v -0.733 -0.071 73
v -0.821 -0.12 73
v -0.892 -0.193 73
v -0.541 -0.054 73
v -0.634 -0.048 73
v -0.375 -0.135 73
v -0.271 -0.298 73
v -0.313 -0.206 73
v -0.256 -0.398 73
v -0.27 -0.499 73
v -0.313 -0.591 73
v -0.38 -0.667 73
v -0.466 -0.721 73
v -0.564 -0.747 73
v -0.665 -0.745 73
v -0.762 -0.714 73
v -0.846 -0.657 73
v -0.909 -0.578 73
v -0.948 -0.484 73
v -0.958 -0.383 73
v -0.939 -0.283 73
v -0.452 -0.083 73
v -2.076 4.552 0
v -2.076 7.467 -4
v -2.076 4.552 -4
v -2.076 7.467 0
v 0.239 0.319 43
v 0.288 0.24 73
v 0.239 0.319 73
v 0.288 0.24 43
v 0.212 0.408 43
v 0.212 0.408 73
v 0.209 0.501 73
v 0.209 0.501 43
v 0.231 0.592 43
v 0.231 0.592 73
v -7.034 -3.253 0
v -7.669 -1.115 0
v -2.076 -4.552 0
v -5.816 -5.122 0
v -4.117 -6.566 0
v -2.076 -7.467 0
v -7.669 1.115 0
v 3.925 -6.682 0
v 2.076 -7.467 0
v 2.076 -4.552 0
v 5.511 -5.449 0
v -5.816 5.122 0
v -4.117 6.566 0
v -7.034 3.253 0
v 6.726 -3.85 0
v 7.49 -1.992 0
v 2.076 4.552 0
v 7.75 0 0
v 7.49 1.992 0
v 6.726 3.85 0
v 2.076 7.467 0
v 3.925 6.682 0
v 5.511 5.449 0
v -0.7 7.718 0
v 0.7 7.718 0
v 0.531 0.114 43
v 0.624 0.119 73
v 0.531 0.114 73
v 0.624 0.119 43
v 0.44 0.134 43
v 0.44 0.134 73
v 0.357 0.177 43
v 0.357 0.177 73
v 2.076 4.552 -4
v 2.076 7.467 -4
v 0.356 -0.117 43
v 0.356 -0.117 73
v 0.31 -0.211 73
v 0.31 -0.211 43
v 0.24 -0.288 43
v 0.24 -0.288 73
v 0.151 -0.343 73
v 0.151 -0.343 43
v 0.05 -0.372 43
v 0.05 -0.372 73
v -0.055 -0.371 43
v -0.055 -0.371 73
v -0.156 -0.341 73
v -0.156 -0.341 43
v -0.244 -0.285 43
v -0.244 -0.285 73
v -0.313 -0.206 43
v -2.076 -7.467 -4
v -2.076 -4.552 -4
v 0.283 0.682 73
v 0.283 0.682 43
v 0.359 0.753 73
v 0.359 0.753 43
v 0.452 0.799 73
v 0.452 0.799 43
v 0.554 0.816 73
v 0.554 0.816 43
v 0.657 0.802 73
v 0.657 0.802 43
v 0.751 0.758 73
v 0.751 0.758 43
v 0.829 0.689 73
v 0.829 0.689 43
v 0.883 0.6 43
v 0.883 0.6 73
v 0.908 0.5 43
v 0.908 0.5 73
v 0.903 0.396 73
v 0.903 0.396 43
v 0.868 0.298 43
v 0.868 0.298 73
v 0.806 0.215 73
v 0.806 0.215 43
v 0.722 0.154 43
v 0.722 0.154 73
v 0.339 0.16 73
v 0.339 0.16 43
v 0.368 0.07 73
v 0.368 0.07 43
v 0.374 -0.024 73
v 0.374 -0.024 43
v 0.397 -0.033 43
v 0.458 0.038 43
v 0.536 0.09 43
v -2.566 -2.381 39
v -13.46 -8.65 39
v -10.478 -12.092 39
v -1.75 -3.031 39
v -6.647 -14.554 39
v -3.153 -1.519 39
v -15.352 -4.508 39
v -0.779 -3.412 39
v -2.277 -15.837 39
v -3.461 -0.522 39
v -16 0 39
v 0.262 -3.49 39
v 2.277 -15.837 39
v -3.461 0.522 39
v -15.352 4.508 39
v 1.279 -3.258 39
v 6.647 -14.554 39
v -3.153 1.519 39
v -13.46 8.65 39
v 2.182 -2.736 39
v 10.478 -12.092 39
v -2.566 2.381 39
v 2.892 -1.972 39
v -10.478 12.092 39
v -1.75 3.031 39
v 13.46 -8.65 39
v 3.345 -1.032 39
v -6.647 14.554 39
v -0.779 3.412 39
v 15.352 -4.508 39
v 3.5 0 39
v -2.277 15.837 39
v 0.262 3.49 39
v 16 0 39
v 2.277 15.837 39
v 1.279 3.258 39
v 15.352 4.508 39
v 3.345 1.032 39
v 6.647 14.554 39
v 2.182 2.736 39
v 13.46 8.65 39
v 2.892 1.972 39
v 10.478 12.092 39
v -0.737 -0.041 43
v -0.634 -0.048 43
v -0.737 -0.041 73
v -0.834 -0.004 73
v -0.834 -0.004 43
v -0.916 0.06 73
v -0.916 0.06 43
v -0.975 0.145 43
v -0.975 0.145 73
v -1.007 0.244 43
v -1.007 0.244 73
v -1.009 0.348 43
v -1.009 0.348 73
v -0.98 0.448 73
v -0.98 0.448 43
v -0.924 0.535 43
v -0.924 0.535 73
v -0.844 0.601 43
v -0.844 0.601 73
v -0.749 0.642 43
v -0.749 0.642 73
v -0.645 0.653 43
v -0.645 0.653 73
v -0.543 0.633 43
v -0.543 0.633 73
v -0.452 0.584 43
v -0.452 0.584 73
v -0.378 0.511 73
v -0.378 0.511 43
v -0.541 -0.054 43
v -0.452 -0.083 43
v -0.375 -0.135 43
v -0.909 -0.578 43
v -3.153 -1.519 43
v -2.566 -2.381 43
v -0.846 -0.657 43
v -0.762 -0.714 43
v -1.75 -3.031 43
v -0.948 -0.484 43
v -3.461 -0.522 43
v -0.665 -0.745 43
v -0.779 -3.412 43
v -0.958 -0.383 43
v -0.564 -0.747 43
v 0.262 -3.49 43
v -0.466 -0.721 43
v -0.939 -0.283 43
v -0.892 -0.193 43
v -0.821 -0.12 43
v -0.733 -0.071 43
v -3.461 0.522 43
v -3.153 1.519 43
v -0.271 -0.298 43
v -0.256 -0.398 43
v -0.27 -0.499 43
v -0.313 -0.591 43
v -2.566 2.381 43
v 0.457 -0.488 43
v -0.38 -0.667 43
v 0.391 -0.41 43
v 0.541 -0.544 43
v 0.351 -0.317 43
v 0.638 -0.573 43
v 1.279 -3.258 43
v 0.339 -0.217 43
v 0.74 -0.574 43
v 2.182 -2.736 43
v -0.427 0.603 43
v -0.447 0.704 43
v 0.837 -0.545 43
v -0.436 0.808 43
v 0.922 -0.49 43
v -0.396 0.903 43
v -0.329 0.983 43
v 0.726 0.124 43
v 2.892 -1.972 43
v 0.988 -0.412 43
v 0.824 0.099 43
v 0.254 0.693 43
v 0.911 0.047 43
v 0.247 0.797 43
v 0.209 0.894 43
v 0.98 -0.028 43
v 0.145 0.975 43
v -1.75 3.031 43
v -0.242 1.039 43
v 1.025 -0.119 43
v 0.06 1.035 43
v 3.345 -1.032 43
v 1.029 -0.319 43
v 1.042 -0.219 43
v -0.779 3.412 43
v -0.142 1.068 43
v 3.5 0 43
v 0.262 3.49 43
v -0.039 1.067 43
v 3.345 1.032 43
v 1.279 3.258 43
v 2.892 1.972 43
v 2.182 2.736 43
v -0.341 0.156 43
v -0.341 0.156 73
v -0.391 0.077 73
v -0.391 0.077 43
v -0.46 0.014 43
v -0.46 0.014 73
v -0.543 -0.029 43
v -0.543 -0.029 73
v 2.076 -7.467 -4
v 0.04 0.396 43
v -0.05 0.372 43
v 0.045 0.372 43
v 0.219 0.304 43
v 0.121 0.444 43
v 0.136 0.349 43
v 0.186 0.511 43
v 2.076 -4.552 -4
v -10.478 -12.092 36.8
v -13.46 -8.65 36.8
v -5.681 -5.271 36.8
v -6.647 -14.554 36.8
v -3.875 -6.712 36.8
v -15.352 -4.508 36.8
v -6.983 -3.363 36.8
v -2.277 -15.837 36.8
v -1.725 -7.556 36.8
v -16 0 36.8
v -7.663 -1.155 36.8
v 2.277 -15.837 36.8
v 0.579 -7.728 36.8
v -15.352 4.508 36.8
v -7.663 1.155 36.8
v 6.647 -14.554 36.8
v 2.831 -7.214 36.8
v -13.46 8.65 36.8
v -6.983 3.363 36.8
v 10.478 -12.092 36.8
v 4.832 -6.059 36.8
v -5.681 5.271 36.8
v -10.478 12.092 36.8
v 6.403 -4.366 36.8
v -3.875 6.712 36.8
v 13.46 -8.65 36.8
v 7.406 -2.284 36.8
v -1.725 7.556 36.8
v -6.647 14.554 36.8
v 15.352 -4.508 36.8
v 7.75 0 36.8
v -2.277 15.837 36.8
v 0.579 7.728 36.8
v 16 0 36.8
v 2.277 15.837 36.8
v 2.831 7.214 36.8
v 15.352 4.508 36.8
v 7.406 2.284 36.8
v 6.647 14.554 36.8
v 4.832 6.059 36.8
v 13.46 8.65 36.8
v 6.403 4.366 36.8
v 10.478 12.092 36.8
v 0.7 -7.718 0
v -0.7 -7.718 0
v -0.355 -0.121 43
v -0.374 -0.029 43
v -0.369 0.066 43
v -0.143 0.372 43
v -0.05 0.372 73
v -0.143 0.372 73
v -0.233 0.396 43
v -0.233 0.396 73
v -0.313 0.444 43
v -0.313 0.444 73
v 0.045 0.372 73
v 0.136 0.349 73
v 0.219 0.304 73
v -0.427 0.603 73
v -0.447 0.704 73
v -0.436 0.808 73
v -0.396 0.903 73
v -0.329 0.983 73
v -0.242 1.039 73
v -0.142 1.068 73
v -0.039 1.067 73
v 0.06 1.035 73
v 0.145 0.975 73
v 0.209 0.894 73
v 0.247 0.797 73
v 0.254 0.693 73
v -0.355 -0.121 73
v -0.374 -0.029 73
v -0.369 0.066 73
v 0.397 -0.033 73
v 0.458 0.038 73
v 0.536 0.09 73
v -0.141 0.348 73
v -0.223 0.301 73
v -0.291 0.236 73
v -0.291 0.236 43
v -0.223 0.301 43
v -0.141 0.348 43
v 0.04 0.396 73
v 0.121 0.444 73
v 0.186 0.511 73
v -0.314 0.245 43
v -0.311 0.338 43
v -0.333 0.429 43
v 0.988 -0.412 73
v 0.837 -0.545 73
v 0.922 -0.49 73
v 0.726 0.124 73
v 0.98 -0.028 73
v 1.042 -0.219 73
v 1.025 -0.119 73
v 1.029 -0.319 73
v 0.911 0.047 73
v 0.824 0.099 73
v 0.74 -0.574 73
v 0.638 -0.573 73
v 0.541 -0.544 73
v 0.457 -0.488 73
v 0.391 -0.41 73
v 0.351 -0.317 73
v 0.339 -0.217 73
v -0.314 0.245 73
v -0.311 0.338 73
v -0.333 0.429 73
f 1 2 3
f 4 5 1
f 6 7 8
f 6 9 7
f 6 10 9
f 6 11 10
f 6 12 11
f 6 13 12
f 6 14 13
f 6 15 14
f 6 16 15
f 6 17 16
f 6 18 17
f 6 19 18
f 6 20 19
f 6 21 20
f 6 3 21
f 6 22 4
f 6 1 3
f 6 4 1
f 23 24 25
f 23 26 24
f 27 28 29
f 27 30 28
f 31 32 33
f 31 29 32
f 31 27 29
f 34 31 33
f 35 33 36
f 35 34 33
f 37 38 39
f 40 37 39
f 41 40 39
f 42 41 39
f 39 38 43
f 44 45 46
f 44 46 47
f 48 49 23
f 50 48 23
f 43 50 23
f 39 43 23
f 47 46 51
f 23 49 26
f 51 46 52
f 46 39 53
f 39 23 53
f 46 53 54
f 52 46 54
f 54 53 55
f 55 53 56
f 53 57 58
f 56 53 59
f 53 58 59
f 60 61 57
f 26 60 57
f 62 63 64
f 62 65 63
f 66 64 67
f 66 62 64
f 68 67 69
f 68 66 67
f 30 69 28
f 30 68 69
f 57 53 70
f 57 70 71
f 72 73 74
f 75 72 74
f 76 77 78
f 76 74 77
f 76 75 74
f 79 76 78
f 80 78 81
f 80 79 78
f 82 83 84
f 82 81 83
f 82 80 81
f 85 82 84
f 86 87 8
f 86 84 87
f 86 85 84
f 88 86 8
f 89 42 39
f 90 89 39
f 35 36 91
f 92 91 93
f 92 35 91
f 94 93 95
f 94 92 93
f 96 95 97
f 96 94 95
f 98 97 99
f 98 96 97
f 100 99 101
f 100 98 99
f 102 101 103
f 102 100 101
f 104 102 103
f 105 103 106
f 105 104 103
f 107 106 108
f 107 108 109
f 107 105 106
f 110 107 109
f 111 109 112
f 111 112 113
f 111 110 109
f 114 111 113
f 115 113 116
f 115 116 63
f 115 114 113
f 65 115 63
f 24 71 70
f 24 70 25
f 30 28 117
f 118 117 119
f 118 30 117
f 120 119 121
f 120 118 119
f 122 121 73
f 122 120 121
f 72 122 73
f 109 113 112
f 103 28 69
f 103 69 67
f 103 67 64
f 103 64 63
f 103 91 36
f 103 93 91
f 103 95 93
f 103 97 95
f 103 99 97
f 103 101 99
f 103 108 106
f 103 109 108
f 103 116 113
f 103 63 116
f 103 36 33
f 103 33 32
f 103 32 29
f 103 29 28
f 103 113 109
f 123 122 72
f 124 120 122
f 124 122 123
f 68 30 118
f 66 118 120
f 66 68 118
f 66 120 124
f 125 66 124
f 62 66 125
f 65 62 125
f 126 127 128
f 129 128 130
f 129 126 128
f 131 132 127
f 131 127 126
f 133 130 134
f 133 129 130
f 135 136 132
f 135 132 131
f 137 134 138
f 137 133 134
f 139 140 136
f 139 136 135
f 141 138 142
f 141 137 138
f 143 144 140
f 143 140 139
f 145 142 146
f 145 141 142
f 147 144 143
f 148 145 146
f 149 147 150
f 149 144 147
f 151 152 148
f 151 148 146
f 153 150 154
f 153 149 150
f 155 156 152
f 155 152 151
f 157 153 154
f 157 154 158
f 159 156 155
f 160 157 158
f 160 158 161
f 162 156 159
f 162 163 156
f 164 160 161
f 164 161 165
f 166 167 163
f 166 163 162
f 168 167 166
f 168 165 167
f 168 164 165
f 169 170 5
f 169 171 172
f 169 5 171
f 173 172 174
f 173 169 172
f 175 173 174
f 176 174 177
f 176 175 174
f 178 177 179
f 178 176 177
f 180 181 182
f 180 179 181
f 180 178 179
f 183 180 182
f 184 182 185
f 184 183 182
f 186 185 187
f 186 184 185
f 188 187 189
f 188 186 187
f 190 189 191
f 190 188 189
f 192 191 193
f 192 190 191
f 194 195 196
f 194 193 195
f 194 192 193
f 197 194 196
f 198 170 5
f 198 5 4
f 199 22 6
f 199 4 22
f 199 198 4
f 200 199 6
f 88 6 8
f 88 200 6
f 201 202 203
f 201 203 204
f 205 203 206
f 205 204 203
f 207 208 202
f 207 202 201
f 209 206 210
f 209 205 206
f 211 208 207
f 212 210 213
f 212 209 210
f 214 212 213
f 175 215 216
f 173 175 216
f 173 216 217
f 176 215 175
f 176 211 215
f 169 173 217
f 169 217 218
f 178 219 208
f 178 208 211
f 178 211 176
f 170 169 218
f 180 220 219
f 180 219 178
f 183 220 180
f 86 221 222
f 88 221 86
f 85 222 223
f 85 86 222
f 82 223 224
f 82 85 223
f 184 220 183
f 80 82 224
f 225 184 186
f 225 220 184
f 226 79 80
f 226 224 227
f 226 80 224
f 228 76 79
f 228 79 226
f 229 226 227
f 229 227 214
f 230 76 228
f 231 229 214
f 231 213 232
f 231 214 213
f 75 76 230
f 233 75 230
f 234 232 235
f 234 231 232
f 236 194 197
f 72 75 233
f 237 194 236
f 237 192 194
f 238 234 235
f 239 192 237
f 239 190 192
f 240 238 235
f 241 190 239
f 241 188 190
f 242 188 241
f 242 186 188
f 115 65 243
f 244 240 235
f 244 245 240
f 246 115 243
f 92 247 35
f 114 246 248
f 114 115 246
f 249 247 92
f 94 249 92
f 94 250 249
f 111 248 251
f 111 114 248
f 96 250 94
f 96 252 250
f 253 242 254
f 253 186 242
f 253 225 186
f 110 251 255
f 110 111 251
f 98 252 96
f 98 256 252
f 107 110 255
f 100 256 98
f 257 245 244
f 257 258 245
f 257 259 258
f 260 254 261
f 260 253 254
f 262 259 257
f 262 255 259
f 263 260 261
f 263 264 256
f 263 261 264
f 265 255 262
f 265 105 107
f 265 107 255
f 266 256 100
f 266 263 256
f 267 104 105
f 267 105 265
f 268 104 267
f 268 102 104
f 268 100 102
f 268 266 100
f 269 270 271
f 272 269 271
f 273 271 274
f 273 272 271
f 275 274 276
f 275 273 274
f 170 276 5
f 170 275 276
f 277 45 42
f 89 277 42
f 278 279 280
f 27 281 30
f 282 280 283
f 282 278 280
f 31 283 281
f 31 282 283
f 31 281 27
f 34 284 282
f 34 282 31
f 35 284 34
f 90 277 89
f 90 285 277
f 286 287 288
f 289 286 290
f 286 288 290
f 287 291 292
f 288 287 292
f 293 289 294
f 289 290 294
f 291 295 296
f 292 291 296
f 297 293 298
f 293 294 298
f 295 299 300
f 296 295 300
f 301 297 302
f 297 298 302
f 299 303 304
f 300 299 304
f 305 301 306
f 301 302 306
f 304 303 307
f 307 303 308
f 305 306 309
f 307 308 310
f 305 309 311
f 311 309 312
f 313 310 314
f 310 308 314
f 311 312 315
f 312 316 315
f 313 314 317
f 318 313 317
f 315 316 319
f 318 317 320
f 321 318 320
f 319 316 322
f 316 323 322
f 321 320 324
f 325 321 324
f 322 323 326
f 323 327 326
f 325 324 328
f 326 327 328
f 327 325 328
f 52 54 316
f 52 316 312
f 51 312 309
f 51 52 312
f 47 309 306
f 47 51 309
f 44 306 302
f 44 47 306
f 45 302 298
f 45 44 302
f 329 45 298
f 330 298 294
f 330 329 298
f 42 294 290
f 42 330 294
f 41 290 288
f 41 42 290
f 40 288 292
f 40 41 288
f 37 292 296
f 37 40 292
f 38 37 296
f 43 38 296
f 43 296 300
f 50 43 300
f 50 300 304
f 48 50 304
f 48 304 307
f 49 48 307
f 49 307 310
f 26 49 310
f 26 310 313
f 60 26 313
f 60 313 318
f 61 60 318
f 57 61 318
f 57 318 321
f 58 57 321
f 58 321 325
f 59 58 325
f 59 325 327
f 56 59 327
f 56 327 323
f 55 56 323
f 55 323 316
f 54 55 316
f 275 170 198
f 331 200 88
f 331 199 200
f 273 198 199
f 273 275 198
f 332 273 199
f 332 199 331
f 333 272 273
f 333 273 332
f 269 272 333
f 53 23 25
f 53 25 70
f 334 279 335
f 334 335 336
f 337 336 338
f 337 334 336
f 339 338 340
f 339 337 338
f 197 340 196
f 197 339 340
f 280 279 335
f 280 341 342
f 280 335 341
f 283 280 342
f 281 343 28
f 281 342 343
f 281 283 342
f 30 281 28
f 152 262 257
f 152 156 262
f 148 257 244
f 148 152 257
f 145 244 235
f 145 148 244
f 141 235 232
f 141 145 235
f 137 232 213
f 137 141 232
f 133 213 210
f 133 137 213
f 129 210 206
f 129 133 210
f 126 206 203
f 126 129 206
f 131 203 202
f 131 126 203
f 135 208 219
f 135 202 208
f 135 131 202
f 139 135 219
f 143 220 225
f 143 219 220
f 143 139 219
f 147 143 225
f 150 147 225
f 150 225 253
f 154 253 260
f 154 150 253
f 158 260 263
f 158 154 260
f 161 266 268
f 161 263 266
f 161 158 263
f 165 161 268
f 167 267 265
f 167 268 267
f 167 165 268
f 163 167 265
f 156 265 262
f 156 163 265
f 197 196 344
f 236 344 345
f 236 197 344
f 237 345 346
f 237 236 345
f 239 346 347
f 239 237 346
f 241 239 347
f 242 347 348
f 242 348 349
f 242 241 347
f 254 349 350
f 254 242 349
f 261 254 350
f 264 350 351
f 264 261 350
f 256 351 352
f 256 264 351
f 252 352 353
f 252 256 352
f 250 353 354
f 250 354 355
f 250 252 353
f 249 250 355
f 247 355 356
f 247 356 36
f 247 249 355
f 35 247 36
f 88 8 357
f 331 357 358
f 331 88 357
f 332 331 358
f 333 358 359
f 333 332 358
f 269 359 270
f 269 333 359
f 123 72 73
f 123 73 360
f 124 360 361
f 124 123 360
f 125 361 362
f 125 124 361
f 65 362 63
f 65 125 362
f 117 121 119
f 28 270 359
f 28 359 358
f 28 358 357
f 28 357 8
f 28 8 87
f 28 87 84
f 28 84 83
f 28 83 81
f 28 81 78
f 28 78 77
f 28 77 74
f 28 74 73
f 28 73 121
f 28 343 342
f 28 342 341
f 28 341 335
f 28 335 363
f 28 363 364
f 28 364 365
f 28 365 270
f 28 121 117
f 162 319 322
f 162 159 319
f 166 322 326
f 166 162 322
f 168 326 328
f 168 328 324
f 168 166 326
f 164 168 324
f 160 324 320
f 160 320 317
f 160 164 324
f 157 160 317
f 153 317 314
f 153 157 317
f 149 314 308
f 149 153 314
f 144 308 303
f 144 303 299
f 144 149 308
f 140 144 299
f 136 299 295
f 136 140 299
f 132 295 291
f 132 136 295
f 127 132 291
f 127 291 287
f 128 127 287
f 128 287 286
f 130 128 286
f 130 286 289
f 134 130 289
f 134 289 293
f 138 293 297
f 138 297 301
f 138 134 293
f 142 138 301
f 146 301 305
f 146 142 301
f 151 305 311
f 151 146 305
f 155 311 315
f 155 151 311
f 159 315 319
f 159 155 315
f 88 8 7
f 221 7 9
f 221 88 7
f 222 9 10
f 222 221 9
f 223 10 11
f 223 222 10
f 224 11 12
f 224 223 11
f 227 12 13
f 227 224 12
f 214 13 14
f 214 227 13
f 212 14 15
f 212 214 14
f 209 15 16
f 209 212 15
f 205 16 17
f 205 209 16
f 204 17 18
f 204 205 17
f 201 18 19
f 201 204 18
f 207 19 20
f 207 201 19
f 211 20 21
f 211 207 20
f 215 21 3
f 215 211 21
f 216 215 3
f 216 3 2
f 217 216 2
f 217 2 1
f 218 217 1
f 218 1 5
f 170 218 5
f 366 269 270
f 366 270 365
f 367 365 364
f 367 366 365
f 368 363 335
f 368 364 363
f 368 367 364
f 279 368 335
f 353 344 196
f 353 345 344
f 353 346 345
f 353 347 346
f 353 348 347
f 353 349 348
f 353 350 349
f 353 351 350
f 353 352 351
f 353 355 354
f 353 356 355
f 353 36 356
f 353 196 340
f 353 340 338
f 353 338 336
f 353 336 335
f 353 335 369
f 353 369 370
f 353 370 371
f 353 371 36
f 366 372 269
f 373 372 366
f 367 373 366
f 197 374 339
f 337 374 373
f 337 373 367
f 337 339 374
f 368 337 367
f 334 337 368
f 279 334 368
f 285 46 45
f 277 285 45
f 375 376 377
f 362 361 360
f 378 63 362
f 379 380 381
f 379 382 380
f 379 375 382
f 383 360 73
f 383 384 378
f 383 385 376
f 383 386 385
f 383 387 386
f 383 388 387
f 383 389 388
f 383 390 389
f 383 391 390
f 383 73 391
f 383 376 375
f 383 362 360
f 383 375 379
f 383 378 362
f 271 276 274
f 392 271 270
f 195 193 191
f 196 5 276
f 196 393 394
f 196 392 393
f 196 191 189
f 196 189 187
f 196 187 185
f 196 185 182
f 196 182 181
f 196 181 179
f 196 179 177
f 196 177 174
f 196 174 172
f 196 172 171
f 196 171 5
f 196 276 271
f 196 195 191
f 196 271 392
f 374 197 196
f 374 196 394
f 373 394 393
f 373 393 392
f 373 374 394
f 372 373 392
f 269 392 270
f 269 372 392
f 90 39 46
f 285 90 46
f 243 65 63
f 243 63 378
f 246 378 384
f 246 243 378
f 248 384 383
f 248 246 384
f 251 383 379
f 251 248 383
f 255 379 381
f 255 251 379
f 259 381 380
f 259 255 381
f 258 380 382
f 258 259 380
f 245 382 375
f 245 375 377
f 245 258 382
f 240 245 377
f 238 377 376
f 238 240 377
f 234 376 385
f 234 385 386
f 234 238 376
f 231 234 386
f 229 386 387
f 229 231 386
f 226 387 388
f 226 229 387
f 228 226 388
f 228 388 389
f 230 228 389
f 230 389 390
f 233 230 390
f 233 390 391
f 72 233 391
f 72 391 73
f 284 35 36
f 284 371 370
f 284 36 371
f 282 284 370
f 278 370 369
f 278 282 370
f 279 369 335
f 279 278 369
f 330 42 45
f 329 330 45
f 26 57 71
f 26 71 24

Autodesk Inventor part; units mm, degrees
ref_plane "YZ Plane" through (0, 0, 0) normal (1, 0, 0) x (0, 1, 0)
ref_plane "XZ Plane" through (0, 0, 0) normal (0, 1, 0) x (-1, 0, 0)
ref_plane "XY Plane" through (0, 0, 0) normal (0, 0, 1) x (1, 0, 0)
sketch "Skizze1" plane through (0, 0, 0) normal (0, 0, 1) x (1, 0, 0)
  circle A0 centre (0, 0) radius 7.75
  dimension "d0" = 15.5
extrude "Extrusion1" add sketch "Skizze1" along normal blind 39
sketch "Skizze2" plane through (0, 0, 39) normal (0, 0, 1) x (1, 0, 0)
  circle A0 centre (0, 0) radius 16
  dimension "d3" = 32
extrude "Extrusion2" add sketch "Skizze2" against normal blind 2.2
sketch "Skizze3" plane through (0, 0, 39) normal (0, 0, 1) x (1, 0, 0)
  circle A0 centre (0, 0) radius 3.5
  circle A1 centre (0, 0) radius 16 projected
  dimension "d6" = 7
extrude "Extrusion3" add sketch "Skizze3" along normal blind 4 contours A0
sketch "Skizze4" plane through (0, 0, 43) normal (0, 0, 1) x (1, 0, 0)
  circle A0 centre (0, 0) radius 0.375
  circle A1 centre (-0.607, -0.3988) radius 0.3513
  circle A2 centre (-0.6607, 0.3018) radius 0.3513
  circle A3 centre (-0.096, 0.72) radius 0.3513
  circle A4 centre (0.5586, 0.4643) radius 0.3513
  circle A5 centre (0.6903, -0.2259) radius 0.3513
  dimension "d9" = 0.75
extrude "Extrusion4" add sketch "Skizze4" along normal blind 30 contours A0 | A4 | A5 | A3 | A1 | A2
sketch "Skizze5" plane through (0, 0, 0) normal (0, 0, -1) x (-1, 0, 0)
  circle A0 centre (0, 0) radius 7.75 construction
  line L0 (2.0759, 4.552) -> (-2.0759, 4.552)
  line L1 (-2.0759, 4.552) -> (-2.0759, 7.4668)
  line L2 (-2.0759, 7.4668) -> (2.0759, 7.4668)
  line L3 (2.0759, 7.4668) -> (2.0759, 4.552)
  line L4 (2.0759, -4.552) -> (-2.0759, -4.552)
  line L5 (-2.0759, -4.552) -> (-2.0759, -7.4668)
  line L6 (-2.0759, -7.4668) -> (2.0759, -7.4668)
  line L7 (2.0759, -7.4668) -> (2.0759, -4.552)
  circle A1 centre (0, 0) radius 7.75 construction
  line L8 (0, 7.4668) -> (0, -7.4668) construction
extrude "Extrusion5" add sketch "Skizze5" along normal blind 4
properties part number "Slipring_SNM012A-24" material "ABS-Kunststoff"
